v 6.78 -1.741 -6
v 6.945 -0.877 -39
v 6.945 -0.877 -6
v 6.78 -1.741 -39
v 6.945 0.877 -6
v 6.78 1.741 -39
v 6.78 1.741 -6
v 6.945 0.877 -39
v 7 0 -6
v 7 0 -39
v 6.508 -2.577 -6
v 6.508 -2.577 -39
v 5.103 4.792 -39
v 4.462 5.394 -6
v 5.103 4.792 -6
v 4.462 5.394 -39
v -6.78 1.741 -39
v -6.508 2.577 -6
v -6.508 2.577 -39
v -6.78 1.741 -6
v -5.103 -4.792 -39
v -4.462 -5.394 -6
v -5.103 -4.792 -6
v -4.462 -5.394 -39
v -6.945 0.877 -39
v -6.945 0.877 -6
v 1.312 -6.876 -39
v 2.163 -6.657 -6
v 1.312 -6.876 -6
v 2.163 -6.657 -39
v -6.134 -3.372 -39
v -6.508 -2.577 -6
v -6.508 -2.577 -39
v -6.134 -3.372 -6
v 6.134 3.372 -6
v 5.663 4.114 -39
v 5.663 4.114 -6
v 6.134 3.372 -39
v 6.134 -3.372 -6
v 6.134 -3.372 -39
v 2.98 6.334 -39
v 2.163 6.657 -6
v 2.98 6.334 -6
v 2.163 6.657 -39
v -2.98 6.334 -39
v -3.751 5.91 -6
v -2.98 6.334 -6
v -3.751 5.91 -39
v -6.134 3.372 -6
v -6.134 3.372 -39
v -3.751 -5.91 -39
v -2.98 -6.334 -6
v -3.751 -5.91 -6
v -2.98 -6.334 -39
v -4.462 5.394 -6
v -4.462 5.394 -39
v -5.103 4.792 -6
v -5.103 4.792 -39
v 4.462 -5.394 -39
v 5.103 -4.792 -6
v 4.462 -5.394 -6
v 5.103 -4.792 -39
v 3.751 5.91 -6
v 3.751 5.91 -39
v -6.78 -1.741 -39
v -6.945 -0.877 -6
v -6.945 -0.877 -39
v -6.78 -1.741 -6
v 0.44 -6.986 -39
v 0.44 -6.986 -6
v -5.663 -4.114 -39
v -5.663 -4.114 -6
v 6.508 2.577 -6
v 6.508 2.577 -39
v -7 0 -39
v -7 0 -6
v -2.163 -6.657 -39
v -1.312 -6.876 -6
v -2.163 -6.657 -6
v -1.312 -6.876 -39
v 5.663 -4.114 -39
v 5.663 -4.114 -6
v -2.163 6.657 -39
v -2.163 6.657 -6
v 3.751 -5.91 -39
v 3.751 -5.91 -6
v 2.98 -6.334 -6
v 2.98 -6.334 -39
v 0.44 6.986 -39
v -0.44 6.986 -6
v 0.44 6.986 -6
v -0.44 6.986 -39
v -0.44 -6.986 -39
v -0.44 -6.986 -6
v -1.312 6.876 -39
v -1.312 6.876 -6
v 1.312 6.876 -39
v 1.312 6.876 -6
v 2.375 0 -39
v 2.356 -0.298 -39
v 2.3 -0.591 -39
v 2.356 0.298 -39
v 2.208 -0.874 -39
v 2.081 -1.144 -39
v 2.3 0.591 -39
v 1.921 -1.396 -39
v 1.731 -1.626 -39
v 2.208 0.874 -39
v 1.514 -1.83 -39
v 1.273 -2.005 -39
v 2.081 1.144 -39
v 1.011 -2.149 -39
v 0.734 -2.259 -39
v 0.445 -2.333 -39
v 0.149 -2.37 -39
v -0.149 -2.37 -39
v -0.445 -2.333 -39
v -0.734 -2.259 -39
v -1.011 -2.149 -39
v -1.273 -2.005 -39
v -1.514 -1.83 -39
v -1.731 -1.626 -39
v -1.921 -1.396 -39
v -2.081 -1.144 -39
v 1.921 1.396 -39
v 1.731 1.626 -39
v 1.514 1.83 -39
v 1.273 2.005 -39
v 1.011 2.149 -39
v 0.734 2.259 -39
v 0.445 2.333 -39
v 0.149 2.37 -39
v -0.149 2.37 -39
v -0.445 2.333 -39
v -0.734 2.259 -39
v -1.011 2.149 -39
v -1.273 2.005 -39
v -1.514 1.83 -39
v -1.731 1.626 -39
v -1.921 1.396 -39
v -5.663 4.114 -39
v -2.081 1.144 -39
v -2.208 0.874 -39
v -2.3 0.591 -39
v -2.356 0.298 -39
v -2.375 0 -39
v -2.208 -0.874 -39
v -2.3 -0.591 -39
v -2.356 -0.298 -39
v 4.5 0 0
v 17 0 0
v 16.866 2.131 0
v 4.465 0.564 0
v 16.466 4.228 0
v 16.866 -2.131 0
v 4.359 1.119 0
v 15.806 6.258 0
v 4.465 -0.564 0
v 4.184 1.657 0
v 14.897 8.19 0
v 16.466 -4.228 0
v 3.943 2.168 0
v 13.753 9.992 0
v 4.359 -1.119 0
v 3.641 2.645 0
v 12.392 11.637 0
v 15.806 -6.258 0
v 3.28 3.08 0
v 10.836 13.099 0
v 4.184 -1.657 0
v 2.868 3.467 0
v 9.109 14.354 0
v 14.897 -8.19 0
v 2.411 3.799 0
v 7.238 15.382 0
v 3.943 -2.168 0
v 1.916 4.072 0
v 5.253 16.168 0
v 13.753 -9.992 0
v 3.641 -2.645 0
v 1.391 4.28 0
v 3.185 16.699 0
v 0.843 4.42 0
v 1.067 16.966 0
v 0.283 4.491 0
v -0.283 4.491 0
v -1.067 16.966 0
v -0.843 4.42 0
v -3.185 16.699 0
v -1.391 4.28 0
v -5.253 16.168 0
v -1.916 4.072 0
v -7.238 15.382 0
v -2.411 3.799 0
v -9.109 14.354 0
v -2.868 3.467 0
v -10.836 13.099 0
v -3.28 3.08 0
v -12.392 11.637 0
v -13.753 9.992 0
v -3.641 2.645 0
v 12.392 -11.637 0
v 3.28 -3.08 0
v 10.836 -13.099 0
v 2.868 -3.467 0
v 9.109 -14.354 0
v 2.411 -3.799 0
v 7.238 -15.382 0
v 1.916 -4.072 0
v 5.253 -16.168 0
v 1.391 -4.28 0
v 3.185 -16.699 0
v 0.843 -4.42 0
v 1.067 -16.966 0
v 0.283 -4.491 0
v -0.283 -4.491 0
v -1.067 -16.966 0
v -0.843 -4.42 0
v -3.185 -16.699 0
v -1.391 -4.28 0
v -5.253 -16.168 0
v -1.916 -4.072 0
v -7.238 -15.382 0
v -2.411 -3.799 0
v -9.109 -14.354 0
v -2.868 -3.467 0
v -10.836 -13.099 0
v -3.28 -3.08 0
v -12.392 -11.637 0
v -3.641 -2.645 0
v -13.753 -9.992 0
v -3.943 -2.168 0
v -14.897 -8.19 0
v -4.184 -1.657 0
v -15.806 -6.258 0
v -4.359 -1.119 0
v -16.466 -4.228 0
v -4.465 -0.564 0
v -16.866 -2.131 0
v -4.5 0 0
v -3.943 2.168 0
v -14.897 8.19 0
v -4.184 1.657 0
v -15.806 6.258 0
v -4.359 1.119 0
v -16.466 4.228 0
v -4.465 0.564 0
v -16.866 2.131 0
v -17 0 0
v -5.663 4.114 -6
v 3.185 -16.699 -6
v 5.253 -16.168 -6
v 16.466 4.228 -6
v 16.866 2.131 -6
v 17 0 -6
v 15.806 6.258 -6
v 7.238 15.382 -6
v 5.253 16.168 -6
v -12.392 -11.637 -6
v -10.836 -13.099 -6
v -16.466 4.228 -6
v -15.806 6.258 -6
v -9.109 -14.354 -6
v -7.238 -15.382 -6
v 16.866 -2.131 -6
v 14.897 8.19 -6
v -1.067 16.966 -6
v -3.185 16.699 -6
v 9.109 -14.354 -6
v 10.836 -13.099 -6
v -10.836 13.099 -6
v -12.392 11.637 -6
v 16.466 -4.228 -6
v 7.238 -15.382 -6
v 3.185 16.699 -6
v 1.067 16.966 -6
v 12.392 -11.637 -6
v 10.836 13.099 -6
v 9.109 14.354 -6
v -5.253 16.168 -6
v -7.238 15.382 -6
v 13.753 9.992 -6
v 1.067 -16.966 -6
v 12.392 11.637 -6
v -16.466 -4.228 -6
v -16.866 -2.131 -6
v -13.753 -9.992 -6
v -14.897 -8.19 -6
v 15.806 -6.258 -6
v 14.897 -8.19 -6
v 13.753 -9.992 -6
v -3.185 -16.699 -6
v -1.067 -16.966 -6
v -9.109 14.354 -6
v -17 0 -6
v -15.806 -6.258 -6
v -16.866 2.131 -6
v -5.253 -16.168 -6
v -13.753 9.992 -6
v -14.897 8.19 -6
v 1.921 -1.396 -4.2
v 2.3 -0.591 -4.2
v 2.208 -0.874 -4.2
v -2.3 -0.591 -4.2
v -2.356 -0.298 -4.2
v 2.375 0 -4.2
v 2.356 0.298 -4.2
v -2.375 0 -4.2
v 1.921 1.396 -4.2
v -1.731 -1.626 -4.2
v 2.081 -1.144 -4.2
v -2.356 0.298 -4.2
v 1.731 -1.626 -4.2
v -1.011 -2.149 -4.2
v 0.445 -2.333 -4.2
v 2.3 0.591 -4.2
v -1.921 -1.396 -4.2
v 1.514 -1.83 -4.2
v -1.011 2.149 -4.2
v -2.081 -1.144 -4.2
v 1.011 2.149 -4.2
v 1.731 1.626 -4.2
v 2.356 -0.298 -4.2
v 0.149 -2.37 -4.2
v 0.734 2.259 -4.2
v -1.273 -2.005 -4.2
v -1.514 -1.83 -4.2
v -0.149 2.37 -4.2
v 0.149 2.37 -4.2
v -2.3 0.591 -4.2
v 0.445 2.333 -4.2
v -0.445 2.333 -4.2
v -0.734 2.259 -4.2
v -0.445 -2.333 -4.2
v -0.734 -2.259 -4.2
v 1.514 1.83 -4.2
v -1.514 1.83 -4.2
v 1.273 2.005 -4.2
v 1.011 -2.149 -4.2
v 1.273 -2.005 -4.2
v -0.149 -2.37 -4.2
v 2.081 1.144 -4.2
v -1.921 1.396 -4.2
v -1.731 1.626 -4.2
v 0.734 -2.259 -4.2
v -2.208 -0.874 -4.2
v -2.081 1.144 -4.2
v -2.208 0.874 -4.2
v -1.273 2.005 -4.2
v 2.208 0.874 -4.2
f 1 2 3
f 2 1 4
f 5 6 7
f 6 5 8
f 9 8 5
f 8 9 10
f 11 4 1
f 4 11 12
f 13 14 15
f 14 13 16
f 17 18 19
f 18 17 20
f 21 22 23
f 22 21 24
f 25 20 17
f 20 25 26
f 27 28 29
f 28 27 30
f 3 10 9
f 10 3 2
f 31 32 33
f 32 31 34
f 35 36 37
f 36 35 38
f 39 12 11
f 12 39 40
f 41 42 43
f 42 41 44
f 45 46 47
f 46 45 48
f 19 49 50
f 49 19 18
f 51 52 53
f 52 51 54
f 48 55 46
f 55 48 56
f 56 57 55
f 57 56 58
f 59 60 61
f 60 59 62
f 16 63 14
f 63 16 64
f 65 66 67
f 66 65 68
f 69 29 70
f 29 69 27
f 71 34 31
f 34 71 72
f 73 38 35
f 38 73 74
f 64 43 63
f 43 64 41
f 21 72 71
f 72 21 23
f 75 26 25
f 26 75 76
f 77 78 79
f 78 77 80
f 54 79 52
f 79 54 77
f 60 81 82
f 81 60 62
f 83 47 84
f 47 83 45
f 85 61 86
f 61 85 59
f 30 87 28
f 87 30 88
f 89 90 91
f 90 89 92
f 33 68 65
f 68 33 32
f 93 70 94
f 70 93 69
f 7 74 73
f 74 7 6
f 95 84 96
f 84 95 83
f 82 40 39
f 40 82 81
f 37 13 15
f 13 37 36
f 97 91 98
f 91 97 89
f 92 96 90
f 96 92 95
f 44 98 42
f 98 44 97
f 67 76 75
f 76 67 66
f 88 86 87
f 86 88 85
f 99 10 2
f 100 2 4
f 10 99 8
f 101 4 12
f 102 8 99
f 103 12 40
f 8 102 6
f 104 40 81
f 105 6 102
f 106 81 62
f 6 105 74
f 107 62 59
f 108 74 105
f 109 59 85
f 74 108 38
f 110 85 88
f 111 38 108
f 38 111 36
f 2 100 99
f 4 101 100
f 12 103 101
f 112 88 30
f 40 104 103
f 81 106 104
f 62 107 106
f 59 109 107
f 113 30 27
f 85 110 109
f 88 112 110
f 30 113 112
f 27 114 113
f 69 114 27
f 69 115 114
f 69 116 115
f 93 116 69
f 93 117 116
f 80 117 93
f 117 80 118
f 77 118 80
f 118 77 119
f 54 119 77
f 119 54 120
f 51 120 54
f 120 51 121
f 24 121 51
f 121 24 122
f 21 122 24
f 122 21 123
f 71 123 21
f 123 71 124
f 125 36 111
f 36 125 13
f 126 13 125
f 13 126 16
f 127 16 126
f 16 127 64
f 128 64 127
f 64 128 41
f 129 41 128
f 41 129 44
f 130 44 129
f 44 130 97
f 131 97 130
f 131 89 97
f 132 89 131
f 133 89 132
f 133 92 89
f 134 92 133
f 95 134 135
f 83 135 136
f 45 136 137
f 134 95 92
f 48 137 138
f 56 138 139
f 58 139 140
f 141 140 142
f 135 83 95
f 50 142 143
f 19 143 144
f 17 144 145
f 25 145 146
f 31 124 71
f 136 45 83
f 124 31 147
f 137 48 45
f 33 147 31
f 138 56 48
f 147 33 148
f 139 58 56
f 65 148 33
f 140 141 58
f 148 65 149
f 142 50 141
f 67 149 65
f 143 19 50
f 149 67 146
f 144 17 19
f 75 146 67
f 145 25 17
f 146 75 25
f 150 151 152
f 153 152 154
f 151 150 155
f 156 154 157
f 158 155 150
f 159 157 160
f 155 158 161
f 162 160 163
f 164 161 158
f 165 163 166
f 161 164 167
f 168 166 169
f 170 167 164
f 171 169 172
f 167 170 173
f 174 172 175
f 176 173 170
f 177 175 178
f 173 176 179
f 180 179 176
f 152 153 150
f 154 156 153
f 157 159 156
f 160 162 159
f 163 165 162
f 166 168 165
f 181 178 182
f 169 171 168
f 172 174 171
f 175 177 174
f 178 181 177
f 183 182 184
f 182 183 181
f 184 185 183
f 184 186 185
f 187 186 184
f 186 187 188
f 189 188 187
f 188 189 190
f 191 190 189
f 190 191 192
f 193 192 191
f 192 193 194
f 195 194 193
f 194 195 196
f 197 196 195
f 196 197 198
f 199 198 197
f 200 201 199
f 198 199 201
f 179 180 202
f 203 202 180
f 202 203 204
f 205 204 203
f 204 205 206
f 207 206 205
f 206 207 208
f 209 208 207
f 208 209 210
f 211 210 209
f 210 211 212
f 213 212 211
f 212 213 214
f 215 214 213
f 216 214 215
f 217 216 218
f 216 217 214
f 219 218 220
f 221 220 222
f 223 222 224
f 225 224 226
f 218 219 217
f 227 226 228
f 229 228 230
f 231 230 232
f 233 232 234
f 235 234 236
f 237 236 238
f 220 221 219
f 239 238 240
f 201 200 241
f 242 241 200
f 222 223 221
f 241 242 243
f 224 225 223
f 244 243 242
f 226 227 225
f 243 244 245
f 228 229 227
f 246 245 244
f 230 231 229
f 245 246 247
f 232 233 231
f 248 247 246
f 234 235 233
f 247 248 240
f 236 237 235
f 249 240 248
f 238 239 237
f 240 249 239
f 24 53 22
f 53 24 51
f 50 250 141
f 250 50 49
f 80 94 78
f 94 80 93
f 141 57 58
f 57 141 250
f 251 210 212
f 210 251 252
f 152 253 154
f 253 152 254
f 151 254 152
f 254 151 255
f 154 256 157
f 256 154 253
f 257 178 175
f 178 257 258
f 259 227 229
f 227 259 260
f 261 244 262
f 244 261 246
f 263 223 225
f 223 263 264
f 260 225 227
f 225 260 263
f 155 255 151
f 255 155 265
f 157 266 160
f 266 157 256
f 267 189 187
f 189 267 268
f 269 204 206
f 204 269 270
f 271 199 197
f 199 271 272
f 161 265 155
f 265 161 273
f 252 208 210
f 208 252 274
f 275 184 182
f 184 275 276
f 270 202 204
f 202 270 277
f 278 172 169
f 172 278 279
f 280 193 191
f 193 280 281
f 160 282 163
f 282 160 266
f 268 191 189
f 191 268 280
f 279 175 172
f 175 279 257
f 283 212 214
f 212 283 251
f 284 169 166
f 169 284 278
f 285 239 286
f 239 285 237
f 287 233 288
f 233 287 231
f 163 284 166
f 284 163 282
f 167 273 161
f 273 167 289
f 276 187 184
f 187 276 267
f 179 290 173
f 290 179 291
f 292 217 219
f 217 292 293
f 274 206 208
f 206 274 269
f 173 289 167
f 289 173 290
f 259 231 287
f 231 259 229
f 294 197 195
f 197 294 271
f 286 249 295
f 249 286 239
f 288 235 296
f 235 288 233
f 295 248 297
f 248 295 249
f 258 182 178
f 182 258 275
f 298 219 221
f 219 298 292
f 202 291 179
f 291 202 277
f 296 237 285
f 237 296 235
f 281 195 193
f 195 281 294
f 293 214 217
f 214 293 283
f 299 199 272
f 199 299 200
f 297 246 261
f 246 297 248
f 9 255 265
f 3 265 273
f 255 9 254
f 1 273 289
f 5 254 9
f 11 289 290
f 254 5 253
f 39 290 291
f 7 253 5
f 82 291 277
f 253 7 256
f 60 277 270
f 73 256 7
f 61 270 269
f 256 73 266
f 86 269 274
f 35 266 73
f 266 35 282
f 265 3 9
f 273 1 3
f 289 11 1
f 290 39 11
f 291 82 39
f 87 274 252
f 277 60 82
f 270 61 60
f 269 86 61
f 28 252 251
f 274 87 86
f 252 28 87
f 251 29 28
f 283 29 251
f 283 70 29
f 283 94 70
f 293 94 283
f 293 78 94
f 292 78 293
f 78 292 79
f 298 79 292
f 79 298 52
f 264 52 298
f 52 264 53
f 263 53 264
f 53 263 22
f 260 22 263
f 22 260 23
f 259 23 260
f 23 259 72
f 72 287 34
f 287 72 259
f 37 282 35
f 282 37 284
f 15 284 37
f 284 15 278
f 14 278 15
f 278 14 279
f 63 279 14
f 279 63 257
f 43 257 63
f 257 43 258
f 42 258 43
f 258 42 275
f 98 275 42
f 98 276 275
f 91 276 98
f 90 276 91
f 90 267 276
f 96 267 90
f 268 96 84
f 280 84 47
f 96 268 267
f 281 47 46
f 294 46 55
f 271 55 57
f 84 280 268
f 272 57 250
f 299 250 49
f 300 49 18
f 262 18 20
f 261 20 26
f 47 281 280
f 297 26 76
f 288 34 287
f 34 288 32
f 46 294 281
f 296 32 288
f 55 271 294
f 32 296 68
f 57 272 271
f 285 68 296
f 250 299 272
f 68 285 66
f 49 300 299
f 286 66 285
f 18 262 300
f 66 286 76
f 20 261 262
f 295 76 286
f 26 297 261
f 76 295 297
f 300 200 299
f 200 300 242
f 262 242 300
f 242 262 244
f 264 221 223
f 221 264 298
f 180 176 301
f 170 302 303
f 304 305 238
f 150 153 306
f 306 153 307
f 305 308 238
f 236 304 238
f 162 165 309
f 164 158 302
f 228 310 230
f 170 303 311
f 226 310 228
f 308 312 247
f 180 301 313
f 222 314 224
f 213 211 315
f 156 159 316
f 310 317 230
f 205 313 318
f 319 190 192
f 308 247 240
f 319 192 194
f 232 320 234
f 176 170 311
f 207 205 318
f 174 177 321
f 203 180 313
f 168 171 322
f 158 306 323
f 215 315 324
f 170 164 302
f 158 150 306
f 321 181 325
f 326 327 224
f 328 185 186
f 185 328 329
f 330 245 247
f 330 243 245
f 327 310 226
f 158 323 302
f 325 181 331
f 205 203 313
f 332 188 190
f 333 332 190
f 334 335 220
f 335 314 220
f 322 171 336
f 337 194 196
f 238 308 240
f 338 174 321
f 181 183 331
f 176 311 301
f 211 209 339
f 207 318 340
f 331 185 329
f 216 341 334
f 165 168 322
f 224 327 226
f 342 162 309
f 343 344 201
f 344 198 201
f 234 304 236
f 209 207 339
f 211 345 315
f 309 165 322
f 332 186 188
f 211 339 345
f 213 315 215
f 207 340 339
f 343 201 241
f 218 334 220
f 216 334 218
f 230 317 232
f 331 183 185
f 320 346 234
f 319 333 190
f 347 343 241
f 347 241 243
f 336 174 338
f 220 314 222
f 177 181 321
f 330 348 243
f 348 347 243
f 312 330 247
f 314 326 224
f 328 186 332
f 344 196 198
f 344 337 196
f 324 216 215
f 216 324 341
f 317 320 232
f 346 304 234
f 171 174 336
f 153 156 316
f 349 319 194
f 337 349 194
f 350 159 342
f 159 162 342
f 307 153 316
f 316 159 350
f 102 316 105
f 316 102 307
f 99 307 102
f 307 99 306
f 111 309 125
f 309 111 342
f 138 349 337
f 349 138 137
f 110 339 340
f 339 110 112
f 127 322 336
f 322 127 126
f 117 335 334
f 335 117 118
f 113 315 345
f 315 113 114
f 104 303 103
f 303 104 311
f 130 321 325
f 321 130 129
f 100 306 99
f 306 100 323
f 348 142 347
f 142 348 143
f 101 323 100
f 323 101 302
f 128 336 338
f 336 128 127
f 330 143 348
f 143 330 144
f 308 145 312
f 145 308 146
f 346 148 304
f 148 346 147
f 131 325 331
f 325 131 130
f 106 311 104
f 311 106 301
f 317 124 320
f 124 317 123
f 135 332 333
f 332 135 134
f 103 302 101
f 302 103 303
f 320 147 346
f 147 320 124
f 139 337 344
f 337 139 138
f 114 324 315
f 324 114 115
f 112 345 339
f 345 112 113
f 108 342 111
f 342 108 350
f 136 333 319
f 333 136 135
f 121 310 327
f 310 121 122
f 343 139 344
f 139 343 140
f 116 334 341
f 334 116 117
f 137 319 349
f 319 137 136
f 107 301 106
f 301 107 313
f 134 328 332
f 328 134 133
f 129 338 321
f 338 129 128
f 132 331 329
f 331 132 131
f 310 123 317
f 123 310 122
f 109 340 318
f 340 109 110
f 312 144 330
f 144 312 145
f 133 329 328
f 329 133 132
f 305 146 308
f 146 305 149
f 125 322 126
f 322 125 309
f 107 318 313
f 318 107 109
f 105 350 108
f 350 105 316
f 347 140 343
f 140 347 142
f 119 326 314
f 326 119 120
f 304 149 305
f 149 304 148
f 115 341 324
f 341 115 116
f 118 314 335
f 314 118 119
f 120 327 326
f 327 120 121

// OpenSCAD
$fn = 50;


difference() {
	union() {
		translate(v = [0, 0, -39.0000000000]) {
			cylinder(h = 39, r = 7.0000000000);
		}
		translate(v = [0, 0, -6.0000000000]) {
			cylinder(h = 6, r = 17.0000000000);
		}
	}
	union() {
		translate(v = [0, 0, 0]) {
			rotate(a = [0, 0, 0]) {
				difference() {
					union() {
						#translate(v = [0, 0, -39.0000000000]) {
							cylinder(h = 39, r = 2.2500000000);
						}
						#translate(v = [0, 0, -4.2000000000]) {
							cylinder(h = 4.2000000000, r = 7.0000000000, r1 = 2.3750000000, r2 = 4.5000000000);
						}
						#translate(v = [0, 0, -39.0000000000]) {
							cylinder(h = 39, r = 2.3750000000);
						}
						#translate(v = [0, 0, -39.0000000000]) {
							cylinder(h = 39, r = 2.2500000000);
						}
					}
					union();
				}
			}
		}
	}
}
